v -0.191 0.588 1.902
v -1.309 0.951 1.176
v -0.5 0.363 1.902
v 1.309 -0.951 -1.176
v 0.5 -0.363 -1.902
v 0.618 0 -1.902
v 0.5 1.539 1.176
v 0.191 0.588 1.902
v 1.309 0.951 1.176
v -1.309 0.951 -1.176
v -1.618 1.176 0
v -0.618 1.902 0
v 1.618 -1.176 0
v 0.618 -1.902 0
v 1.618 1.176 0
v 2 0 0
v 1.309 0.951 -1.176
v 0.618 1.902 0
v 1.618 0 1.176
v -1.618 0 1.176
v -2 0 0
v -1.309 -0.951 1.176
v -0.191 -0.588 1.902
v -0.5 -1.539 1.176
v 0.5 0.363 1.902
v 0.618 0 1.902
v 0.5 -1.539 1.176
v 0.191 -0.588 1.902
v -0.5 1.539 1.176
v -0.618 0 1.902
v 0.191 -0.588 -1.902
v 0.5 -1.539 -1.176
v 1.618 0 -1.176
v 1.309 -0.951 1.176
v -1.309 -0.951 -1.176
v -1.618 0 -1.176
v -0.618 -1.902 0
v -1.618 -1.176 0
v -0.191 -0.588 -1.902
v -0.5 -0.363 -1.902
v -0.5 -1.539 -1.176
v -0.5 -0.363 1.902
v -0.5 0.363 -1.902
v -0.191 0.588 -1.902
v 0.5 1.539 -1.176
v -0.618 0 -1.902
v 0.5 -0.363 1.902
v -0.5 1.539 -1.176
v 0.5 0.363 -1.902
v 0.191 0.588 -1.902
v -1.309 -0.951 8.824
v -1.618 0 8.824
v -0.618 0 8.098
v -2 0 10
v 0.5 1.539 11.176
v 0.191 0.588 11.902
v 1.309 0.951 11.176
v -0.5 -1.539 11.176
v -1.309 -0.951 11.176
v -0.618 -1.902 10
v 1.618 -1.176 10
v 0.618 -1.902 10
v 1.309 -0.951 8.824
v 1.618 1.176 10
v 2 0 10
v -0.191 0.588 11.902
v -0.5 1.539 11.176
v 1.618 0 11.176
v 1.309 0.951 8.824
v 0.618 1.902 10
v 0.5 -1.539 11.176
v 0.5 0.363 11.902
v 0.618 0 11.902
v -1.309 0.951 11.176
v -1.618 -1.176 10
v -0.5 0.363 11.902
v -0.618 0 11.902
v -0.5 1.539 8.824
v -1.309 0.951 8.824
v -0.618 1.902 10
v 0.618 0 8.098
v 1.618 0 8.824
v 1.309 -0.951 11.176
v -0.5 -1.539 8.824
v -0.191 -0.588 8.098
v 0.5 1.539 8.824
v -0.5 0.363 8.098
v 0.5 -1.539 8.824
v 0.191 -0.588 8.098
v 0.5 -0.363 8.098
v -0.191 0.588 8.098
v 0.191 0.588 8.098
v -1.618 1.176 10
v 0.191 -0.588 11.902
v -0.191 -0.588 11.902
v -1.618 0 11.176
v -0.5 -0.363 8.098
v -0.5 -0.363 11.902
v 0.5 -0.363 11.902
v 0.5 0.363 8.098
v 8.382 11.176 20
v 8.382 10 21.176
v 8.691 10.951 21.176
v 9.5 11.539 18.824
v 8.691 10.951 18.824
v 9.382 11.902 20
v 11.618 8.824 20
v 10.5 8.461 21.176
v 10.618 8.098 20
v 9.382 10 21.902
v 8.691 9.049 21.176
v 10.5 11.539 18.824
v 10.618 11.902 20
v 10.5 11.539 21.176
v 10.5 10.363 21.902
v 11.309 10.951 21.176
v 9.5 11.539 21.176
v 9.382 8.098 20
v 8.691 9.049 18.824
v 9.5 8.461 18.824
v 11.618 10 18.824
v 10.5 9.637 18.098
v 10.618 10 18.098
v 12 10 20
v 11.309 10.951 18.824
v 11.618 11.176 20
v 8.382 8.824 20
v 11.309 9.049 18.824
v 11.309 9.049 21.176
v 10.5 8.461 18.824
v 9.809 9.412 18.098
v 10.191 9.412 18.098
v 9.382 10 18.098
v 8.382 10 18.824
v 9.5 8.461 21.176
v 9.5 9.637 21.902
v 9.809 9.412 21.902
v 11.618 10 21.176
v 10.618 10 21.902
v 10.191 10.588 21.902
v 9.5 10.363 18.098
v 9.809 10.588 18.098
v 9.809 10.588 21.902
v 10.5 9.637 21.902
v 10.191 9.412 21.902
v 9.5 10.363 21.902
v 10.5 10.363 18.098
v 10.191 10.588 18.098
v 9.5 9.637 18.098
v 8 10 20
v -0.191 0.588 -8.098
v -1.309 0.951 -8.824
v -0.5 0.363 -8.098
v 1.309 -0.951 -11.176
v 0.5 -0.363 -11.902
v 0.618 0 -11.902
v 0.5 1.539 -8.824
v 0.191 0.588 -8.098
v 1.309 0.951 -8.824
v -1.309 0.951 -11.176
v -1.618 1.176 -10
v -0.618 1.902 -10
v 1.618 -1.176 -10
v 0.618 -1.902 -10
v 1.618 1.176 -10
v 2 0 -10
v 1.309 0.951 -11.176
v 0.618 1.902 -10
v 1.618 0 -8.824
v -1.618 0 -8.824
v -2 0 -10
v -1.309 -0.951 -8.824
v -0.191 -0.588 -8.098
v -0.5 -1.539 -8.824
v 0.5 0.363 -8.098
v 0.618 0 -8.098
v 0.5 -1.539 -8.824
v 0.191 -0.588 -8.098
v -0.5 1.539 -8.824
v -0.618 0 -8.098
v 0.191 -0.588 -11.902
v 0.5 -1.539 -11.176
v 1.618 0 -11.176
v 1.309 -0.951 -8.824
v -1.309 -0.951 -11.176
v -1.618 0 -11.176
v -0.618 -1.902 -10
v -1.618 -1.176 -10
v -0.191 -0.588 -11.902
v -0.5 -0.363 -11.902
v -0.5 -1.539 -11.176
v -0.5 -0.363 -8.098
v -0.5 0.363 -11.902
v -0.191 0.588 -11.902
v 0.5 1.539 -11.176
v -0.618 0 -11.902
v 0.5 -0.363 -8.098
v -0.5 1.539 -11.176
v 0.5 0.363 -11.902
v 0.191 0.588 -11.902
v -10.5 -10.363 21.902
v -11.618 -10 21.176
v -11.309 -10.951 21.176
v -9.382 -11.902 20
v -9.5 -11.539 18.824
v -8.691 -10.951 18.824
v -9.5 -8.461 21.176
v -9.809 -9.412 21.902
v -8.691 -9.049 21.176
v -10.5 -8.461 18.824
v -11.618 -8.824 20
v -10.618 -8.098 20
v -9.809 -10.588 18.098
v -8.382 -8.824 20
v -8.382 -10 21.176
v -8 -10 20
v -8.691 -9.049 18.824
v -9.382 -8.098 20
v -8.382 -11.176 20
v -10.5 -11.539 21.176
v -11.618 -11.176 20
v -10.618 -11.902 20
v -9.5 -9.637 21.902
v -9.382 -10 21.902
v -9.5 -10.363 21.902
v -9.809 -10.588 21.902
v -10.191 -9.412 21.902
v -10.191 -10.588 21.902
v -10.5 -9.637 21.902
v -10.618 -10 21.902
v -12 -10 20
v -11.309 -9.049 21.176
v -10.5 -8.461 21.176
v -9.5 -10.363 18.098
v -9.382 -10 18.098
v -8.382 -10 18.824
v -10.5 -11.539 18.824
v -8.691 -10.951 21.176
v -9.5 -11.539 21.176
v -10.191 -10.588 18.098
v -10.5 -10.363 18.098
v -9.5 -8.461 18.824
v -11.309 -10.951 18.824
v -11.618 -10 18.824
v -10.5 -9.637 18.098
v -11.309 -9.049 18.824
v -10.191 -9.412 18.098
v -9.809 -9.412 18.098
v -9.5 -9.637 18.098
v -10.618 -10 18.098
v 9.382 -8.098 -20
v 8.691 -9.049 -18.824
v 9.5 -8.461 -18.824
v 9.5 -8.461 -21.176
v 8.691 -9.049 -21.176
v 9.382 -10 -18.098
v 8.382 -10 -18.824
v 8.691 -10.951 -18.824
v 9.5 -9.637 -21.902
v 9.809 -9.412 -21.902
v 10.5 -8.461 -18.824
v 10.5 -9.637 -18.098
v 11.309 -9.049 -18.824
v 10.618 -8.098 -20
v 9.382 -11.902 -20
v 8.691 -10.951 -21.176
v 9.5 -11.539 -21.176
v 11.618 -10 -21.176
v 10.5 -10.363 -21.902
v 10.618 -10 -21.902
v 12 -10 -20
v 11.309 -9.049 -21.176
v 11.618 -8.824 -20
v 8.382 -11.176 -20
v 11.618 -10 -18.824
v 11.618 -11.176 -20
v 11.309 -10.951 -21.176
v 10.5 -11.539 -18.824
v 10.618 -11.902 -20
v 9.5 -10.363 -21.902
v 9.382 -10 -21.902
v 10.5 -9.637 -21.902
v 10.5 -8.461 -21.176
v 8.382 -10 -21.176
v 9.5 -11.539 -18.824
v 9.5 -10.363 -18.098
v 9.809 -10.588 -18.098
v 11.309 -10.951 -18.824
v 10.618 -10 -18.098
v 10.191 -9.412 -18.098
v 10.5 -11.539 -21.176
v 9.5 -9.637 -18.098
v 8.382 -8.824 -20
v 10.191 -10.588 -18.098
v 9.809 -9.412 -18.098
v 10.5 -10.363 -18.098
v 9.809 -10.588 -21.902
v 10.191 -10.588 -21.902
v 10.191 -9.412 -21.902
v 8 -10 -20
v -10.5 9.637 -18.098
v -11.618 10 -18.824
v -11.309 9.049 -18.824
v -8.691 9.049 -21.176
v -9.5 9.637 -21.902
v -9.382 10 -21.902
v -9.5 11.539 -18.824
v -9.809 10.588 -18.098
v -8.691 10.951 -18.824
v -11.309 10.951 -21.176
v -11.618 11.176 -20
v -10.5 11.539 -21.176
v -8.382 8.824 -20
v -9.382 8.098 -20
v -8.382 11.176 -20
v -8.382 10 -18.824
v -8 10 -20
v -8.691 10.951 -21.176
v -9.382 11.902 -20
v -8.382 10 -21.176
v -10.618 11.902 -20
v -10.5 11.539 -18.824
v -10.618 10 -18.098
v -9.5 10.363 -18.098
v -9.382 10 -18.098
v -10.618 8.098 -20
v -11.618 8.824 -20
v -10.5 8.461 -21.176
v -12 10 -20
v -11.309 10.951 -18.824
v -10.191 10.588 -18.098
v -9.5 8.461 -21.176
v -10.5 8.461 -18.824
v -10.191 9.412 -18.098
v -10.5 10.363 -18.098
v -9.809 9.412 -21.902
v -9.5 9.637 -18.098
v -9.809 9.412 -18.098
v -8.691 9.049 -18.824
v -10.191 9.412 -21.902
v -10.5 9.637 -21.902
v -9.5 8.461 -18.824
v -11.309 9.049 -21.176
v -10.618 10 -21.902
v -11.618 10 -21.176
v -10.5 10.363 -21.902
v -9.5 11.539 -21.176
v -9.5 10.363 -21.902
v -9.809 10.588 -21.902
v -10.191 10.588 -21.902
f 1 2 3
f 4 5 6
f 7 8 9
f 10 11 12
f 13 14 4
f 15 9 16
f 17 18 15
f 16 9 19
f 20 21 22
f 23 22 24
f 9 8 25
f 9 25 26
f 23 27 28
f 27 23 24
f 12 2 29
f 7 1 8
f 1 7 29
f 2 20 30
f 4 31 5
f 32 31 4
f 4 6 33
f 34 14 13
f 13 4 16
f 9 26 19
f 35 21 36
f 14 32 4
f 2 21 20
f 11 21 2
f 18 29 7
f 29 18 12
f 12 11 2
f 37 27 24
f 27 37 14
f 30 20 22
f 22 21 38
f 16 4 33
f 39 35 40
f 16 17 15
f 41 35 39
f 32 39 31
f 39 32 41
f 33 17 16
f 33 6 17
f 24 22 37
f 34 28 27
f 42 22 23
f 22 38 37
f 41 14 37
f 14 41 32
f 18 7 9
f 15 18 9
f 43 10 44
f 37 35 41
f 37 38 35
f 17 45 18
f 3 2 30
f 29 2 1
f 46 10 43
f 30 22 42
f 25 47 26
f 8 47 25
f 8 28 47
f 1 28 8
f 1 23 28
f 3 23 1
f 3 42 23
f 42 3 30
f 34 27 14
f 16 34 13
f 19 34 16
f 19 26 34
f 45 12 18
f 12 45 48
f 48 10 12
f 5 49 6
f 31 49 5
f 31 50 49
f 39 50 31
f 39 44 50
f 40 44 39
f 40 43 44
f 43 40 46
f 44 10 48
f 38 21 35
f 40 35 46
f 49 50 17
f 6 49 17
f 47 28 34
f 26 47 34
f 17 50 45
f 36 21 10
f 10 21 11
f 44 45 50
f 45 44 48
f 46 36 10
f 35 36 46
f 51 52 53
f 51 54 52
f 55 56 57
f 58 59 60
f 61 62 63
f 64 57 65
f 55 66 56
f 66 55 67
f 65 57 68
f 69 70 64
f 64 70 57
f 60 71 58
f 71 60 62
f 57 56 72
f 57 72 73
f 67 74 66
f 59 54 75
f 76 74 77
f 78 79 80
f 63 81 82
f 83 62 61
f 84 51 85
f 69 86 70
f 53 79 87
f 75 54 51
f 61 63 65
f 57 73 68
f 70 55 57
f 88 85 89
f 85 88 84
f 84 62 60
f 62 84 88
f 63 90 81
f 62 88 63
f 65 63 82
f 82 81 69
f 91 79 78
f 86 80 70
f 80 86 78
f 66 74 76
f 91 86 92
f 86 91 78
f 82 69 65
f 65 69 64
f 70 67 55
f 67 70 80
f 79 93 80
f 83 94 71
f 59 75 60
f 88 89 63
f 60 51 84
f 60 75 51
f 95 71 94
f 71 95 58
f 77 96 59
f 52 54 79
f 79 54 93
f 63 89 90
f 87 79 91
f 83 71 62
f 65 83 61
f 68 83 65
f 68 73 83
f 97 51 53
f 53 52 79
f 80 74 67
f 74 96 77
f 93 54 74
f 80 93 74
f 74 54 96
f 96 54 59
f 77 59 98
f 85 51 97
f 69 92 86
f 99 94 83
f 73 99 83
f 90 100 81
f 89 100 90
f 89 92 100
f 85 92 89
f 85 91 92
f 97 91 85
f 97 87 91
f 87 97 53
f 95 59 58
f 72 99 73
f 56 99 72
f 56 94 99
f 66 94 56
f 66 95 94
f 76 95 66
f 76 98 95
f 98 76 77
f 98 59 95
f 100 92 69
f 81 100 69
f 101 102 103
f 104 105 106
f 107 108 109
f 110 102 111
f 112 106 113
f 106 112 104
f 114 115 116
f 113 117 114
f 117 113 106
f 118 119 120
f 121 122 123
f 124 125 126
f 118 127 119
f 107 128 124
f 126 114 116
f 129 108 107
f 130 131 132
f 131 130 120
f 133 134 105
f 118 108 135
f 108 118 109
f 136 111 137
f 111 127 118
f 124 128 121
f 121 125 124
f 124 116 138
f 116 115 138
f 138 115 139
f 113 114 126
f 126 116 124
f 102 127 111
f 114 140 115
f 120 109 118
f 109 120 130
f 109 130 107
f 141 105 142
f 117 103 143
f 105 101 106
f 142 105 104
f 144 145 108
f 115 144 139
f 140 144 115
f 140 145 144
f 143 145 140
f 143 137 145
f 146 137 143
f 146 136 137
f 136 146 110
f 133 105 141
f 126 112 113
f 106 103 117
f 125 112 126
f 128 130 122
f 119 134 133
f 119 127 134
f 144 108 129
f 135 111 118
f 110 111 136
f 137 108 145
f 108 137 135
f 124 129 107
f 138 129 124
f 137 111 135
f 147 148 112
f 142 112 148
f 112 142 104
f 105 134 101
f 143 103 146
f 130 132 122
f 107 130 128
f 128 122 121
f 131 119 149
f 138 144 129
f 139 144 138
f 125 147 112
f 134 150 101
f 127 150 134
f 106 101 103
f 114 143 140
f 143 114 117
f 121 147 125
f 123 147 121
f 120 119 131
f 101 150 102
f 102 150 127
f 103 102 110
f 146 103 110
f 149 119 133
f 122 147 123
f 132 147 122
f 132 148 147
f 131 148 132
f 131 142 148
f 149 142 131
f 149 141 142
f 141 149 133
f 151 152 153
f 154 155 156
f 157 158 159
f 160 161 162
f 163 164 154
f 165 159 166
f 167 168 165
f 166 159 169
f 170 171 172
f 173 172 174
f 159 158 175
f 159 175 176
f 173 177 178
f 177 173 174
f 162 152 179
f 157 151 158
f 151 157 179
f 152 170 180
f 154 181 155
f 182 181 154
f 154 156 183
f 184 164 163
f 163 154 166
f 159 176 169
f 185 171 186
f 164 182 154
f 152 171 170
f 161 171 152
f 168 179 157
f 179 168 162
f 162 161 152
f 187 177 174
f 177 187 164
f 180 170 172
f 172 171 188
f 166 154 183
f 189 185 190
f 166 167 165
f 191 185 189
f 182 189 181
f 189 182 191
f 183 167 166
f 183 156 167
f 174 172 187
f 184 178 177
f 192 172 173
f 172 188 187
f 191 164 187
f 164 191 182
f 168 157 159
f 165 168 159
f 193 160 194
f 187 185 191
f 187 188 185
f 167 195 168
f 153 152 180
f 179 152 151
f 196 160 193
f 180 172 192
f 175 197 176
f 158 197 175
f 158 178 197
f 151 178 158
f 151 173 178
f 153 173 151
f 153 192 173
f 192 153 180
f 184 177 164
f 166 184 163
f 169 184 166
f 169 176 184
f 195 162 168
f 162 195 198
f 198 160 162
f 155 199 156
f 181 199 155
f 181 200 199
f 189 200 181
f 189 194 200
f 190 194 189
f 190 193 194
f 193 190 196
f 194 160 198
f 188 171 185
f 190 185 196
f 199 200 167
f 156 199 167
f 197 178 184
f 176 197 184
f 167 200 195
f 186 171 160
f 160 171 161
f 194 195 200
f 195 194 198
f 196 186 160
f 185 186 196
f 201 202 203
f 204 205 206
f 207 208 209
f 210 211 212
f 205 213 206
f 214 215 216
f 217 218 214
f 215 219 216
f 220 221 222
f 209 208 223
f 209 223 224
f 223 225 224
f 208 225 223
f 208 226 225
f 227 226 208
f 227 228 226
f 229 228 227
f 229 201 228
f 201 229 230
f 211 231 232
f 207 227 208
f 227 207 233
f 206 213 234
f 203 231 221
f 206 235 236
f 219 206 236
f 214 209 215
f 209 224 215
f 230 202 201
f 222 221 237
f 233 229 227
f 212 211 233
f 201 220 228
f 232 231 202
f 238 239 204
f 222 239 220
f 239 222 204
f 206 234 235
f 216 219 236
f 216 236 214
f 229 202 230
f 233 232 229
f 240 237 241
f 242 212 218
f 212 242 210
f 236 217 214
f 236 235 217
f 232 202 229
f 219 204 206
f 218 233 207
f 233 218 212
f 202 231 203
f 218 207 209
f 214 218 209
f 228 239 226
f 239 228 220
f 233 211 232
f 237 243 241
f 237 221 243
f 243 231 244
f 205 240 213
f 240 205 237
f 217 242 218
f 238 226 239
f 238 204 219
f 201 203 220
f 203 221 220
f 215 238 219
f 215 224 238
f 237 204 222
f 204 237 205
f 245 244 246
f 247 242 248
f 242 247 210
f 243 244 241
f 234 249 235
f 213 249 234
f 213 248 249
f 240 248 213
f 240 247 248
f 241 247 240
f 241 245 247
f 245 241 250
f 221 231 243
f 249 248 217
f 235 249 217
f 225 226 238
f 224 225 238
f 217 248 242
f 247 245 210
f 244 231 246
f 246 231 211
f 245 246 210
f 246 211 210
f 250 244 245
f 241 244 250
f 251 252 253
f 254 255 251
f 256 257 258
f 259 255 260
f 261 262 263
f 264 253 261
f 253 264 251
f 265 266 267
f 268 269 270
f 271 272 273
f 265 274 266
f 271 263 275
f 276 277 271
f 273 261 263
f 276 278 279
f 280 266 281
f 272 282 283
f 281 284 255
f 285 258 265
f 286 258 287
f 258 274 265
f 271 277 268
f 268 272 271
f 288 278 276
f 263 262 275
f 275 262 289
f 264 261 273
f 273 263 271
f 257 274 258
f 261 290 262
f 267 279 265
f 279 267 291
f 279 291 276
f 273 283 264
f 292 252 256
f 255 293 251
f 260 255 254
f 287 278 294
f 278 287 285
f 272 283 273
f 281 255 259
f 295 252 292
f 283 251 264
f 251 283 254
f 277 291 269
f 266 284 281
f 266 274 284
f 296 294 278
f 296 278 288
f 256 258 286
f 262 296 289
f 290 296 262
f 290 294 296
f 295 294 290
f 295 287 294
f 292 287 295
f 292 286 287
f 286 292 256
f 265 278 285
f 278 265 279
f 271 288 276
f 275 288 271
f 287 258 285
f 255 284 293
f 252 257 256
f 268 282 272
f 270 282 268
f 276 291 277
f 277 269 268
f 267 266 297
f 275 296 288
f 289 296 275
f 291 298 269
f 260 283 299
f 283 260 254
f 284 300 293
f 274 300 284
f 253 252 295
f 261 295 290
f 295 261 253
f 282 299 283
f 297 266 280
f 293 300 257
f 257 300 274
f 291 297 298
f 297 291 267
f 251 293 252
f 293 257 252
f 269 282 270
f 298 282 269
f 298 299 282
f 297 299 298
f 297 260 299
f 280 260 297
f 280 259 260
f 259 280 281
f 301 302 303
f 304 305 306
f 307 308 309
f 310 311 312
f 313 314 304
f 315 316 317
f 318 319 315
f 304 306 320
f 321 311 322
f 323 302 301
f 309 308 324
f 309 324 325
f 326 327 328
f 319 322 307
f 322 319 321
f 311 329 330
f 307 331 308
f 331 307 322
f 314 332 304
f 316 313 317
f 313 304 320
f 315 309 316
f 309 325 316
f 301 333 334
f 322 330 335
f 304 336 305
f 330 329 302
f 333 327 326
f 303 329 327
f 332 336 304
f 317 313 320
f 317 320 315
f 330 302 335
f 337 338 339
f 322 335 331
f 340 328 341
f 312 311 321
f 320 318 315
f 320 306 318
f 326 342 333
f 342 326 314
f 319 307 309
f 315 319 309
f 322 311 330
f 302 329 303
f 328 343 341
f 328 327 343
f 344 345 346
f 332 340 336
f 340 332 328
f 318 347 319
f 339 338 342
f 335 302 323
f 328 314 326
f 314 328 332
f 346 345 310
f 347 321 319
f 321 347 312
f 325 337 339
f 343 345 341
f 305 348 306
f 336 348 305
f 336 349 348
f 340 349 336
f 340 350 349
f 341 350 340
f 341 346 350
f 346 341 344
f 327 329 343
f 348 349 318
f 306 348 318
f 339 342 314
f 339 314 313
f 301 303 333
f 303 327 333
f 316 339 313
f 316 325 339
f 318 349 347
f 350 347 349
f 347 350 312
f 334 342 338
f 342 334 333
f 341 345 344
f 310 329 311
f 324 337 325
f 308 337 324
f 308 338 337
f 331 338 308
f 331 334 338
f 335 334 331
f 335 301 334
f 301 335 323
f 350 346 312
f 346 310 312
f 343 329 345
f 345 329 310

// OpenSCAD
union() {
	translate(v = [0, 0, 0]) {
		sphere($fn = 10, r = 2);
	}
	translate(v = [0, 0, 0]) {
		sphere($fn = 10, r = 2);
	}
	translate(v = [0, 0, 10]) {
		sphere($fn = 10, r = 2);
	}
	translate(v = [10, 10, 20]) {
		sphere($fn = 10, r = 2);
	}
	translate(v = [ 0.0000000e+00, 1.2246468e-15,-1.0000000e+01]) {
		sphere($fn = 10, r = 2);
	}
	translate(v = [-10.,-10., 20.]) {
		sphere($fn = 10, r = 2);
	}
	translate(v = [ 10.,-10.,-20.]) {
		sphere($fn = 10, r = 2);
	}
	translate(v = [-10., 10.,-20.]) {
		sphere($fn = 10, r = 2);
	}
}
